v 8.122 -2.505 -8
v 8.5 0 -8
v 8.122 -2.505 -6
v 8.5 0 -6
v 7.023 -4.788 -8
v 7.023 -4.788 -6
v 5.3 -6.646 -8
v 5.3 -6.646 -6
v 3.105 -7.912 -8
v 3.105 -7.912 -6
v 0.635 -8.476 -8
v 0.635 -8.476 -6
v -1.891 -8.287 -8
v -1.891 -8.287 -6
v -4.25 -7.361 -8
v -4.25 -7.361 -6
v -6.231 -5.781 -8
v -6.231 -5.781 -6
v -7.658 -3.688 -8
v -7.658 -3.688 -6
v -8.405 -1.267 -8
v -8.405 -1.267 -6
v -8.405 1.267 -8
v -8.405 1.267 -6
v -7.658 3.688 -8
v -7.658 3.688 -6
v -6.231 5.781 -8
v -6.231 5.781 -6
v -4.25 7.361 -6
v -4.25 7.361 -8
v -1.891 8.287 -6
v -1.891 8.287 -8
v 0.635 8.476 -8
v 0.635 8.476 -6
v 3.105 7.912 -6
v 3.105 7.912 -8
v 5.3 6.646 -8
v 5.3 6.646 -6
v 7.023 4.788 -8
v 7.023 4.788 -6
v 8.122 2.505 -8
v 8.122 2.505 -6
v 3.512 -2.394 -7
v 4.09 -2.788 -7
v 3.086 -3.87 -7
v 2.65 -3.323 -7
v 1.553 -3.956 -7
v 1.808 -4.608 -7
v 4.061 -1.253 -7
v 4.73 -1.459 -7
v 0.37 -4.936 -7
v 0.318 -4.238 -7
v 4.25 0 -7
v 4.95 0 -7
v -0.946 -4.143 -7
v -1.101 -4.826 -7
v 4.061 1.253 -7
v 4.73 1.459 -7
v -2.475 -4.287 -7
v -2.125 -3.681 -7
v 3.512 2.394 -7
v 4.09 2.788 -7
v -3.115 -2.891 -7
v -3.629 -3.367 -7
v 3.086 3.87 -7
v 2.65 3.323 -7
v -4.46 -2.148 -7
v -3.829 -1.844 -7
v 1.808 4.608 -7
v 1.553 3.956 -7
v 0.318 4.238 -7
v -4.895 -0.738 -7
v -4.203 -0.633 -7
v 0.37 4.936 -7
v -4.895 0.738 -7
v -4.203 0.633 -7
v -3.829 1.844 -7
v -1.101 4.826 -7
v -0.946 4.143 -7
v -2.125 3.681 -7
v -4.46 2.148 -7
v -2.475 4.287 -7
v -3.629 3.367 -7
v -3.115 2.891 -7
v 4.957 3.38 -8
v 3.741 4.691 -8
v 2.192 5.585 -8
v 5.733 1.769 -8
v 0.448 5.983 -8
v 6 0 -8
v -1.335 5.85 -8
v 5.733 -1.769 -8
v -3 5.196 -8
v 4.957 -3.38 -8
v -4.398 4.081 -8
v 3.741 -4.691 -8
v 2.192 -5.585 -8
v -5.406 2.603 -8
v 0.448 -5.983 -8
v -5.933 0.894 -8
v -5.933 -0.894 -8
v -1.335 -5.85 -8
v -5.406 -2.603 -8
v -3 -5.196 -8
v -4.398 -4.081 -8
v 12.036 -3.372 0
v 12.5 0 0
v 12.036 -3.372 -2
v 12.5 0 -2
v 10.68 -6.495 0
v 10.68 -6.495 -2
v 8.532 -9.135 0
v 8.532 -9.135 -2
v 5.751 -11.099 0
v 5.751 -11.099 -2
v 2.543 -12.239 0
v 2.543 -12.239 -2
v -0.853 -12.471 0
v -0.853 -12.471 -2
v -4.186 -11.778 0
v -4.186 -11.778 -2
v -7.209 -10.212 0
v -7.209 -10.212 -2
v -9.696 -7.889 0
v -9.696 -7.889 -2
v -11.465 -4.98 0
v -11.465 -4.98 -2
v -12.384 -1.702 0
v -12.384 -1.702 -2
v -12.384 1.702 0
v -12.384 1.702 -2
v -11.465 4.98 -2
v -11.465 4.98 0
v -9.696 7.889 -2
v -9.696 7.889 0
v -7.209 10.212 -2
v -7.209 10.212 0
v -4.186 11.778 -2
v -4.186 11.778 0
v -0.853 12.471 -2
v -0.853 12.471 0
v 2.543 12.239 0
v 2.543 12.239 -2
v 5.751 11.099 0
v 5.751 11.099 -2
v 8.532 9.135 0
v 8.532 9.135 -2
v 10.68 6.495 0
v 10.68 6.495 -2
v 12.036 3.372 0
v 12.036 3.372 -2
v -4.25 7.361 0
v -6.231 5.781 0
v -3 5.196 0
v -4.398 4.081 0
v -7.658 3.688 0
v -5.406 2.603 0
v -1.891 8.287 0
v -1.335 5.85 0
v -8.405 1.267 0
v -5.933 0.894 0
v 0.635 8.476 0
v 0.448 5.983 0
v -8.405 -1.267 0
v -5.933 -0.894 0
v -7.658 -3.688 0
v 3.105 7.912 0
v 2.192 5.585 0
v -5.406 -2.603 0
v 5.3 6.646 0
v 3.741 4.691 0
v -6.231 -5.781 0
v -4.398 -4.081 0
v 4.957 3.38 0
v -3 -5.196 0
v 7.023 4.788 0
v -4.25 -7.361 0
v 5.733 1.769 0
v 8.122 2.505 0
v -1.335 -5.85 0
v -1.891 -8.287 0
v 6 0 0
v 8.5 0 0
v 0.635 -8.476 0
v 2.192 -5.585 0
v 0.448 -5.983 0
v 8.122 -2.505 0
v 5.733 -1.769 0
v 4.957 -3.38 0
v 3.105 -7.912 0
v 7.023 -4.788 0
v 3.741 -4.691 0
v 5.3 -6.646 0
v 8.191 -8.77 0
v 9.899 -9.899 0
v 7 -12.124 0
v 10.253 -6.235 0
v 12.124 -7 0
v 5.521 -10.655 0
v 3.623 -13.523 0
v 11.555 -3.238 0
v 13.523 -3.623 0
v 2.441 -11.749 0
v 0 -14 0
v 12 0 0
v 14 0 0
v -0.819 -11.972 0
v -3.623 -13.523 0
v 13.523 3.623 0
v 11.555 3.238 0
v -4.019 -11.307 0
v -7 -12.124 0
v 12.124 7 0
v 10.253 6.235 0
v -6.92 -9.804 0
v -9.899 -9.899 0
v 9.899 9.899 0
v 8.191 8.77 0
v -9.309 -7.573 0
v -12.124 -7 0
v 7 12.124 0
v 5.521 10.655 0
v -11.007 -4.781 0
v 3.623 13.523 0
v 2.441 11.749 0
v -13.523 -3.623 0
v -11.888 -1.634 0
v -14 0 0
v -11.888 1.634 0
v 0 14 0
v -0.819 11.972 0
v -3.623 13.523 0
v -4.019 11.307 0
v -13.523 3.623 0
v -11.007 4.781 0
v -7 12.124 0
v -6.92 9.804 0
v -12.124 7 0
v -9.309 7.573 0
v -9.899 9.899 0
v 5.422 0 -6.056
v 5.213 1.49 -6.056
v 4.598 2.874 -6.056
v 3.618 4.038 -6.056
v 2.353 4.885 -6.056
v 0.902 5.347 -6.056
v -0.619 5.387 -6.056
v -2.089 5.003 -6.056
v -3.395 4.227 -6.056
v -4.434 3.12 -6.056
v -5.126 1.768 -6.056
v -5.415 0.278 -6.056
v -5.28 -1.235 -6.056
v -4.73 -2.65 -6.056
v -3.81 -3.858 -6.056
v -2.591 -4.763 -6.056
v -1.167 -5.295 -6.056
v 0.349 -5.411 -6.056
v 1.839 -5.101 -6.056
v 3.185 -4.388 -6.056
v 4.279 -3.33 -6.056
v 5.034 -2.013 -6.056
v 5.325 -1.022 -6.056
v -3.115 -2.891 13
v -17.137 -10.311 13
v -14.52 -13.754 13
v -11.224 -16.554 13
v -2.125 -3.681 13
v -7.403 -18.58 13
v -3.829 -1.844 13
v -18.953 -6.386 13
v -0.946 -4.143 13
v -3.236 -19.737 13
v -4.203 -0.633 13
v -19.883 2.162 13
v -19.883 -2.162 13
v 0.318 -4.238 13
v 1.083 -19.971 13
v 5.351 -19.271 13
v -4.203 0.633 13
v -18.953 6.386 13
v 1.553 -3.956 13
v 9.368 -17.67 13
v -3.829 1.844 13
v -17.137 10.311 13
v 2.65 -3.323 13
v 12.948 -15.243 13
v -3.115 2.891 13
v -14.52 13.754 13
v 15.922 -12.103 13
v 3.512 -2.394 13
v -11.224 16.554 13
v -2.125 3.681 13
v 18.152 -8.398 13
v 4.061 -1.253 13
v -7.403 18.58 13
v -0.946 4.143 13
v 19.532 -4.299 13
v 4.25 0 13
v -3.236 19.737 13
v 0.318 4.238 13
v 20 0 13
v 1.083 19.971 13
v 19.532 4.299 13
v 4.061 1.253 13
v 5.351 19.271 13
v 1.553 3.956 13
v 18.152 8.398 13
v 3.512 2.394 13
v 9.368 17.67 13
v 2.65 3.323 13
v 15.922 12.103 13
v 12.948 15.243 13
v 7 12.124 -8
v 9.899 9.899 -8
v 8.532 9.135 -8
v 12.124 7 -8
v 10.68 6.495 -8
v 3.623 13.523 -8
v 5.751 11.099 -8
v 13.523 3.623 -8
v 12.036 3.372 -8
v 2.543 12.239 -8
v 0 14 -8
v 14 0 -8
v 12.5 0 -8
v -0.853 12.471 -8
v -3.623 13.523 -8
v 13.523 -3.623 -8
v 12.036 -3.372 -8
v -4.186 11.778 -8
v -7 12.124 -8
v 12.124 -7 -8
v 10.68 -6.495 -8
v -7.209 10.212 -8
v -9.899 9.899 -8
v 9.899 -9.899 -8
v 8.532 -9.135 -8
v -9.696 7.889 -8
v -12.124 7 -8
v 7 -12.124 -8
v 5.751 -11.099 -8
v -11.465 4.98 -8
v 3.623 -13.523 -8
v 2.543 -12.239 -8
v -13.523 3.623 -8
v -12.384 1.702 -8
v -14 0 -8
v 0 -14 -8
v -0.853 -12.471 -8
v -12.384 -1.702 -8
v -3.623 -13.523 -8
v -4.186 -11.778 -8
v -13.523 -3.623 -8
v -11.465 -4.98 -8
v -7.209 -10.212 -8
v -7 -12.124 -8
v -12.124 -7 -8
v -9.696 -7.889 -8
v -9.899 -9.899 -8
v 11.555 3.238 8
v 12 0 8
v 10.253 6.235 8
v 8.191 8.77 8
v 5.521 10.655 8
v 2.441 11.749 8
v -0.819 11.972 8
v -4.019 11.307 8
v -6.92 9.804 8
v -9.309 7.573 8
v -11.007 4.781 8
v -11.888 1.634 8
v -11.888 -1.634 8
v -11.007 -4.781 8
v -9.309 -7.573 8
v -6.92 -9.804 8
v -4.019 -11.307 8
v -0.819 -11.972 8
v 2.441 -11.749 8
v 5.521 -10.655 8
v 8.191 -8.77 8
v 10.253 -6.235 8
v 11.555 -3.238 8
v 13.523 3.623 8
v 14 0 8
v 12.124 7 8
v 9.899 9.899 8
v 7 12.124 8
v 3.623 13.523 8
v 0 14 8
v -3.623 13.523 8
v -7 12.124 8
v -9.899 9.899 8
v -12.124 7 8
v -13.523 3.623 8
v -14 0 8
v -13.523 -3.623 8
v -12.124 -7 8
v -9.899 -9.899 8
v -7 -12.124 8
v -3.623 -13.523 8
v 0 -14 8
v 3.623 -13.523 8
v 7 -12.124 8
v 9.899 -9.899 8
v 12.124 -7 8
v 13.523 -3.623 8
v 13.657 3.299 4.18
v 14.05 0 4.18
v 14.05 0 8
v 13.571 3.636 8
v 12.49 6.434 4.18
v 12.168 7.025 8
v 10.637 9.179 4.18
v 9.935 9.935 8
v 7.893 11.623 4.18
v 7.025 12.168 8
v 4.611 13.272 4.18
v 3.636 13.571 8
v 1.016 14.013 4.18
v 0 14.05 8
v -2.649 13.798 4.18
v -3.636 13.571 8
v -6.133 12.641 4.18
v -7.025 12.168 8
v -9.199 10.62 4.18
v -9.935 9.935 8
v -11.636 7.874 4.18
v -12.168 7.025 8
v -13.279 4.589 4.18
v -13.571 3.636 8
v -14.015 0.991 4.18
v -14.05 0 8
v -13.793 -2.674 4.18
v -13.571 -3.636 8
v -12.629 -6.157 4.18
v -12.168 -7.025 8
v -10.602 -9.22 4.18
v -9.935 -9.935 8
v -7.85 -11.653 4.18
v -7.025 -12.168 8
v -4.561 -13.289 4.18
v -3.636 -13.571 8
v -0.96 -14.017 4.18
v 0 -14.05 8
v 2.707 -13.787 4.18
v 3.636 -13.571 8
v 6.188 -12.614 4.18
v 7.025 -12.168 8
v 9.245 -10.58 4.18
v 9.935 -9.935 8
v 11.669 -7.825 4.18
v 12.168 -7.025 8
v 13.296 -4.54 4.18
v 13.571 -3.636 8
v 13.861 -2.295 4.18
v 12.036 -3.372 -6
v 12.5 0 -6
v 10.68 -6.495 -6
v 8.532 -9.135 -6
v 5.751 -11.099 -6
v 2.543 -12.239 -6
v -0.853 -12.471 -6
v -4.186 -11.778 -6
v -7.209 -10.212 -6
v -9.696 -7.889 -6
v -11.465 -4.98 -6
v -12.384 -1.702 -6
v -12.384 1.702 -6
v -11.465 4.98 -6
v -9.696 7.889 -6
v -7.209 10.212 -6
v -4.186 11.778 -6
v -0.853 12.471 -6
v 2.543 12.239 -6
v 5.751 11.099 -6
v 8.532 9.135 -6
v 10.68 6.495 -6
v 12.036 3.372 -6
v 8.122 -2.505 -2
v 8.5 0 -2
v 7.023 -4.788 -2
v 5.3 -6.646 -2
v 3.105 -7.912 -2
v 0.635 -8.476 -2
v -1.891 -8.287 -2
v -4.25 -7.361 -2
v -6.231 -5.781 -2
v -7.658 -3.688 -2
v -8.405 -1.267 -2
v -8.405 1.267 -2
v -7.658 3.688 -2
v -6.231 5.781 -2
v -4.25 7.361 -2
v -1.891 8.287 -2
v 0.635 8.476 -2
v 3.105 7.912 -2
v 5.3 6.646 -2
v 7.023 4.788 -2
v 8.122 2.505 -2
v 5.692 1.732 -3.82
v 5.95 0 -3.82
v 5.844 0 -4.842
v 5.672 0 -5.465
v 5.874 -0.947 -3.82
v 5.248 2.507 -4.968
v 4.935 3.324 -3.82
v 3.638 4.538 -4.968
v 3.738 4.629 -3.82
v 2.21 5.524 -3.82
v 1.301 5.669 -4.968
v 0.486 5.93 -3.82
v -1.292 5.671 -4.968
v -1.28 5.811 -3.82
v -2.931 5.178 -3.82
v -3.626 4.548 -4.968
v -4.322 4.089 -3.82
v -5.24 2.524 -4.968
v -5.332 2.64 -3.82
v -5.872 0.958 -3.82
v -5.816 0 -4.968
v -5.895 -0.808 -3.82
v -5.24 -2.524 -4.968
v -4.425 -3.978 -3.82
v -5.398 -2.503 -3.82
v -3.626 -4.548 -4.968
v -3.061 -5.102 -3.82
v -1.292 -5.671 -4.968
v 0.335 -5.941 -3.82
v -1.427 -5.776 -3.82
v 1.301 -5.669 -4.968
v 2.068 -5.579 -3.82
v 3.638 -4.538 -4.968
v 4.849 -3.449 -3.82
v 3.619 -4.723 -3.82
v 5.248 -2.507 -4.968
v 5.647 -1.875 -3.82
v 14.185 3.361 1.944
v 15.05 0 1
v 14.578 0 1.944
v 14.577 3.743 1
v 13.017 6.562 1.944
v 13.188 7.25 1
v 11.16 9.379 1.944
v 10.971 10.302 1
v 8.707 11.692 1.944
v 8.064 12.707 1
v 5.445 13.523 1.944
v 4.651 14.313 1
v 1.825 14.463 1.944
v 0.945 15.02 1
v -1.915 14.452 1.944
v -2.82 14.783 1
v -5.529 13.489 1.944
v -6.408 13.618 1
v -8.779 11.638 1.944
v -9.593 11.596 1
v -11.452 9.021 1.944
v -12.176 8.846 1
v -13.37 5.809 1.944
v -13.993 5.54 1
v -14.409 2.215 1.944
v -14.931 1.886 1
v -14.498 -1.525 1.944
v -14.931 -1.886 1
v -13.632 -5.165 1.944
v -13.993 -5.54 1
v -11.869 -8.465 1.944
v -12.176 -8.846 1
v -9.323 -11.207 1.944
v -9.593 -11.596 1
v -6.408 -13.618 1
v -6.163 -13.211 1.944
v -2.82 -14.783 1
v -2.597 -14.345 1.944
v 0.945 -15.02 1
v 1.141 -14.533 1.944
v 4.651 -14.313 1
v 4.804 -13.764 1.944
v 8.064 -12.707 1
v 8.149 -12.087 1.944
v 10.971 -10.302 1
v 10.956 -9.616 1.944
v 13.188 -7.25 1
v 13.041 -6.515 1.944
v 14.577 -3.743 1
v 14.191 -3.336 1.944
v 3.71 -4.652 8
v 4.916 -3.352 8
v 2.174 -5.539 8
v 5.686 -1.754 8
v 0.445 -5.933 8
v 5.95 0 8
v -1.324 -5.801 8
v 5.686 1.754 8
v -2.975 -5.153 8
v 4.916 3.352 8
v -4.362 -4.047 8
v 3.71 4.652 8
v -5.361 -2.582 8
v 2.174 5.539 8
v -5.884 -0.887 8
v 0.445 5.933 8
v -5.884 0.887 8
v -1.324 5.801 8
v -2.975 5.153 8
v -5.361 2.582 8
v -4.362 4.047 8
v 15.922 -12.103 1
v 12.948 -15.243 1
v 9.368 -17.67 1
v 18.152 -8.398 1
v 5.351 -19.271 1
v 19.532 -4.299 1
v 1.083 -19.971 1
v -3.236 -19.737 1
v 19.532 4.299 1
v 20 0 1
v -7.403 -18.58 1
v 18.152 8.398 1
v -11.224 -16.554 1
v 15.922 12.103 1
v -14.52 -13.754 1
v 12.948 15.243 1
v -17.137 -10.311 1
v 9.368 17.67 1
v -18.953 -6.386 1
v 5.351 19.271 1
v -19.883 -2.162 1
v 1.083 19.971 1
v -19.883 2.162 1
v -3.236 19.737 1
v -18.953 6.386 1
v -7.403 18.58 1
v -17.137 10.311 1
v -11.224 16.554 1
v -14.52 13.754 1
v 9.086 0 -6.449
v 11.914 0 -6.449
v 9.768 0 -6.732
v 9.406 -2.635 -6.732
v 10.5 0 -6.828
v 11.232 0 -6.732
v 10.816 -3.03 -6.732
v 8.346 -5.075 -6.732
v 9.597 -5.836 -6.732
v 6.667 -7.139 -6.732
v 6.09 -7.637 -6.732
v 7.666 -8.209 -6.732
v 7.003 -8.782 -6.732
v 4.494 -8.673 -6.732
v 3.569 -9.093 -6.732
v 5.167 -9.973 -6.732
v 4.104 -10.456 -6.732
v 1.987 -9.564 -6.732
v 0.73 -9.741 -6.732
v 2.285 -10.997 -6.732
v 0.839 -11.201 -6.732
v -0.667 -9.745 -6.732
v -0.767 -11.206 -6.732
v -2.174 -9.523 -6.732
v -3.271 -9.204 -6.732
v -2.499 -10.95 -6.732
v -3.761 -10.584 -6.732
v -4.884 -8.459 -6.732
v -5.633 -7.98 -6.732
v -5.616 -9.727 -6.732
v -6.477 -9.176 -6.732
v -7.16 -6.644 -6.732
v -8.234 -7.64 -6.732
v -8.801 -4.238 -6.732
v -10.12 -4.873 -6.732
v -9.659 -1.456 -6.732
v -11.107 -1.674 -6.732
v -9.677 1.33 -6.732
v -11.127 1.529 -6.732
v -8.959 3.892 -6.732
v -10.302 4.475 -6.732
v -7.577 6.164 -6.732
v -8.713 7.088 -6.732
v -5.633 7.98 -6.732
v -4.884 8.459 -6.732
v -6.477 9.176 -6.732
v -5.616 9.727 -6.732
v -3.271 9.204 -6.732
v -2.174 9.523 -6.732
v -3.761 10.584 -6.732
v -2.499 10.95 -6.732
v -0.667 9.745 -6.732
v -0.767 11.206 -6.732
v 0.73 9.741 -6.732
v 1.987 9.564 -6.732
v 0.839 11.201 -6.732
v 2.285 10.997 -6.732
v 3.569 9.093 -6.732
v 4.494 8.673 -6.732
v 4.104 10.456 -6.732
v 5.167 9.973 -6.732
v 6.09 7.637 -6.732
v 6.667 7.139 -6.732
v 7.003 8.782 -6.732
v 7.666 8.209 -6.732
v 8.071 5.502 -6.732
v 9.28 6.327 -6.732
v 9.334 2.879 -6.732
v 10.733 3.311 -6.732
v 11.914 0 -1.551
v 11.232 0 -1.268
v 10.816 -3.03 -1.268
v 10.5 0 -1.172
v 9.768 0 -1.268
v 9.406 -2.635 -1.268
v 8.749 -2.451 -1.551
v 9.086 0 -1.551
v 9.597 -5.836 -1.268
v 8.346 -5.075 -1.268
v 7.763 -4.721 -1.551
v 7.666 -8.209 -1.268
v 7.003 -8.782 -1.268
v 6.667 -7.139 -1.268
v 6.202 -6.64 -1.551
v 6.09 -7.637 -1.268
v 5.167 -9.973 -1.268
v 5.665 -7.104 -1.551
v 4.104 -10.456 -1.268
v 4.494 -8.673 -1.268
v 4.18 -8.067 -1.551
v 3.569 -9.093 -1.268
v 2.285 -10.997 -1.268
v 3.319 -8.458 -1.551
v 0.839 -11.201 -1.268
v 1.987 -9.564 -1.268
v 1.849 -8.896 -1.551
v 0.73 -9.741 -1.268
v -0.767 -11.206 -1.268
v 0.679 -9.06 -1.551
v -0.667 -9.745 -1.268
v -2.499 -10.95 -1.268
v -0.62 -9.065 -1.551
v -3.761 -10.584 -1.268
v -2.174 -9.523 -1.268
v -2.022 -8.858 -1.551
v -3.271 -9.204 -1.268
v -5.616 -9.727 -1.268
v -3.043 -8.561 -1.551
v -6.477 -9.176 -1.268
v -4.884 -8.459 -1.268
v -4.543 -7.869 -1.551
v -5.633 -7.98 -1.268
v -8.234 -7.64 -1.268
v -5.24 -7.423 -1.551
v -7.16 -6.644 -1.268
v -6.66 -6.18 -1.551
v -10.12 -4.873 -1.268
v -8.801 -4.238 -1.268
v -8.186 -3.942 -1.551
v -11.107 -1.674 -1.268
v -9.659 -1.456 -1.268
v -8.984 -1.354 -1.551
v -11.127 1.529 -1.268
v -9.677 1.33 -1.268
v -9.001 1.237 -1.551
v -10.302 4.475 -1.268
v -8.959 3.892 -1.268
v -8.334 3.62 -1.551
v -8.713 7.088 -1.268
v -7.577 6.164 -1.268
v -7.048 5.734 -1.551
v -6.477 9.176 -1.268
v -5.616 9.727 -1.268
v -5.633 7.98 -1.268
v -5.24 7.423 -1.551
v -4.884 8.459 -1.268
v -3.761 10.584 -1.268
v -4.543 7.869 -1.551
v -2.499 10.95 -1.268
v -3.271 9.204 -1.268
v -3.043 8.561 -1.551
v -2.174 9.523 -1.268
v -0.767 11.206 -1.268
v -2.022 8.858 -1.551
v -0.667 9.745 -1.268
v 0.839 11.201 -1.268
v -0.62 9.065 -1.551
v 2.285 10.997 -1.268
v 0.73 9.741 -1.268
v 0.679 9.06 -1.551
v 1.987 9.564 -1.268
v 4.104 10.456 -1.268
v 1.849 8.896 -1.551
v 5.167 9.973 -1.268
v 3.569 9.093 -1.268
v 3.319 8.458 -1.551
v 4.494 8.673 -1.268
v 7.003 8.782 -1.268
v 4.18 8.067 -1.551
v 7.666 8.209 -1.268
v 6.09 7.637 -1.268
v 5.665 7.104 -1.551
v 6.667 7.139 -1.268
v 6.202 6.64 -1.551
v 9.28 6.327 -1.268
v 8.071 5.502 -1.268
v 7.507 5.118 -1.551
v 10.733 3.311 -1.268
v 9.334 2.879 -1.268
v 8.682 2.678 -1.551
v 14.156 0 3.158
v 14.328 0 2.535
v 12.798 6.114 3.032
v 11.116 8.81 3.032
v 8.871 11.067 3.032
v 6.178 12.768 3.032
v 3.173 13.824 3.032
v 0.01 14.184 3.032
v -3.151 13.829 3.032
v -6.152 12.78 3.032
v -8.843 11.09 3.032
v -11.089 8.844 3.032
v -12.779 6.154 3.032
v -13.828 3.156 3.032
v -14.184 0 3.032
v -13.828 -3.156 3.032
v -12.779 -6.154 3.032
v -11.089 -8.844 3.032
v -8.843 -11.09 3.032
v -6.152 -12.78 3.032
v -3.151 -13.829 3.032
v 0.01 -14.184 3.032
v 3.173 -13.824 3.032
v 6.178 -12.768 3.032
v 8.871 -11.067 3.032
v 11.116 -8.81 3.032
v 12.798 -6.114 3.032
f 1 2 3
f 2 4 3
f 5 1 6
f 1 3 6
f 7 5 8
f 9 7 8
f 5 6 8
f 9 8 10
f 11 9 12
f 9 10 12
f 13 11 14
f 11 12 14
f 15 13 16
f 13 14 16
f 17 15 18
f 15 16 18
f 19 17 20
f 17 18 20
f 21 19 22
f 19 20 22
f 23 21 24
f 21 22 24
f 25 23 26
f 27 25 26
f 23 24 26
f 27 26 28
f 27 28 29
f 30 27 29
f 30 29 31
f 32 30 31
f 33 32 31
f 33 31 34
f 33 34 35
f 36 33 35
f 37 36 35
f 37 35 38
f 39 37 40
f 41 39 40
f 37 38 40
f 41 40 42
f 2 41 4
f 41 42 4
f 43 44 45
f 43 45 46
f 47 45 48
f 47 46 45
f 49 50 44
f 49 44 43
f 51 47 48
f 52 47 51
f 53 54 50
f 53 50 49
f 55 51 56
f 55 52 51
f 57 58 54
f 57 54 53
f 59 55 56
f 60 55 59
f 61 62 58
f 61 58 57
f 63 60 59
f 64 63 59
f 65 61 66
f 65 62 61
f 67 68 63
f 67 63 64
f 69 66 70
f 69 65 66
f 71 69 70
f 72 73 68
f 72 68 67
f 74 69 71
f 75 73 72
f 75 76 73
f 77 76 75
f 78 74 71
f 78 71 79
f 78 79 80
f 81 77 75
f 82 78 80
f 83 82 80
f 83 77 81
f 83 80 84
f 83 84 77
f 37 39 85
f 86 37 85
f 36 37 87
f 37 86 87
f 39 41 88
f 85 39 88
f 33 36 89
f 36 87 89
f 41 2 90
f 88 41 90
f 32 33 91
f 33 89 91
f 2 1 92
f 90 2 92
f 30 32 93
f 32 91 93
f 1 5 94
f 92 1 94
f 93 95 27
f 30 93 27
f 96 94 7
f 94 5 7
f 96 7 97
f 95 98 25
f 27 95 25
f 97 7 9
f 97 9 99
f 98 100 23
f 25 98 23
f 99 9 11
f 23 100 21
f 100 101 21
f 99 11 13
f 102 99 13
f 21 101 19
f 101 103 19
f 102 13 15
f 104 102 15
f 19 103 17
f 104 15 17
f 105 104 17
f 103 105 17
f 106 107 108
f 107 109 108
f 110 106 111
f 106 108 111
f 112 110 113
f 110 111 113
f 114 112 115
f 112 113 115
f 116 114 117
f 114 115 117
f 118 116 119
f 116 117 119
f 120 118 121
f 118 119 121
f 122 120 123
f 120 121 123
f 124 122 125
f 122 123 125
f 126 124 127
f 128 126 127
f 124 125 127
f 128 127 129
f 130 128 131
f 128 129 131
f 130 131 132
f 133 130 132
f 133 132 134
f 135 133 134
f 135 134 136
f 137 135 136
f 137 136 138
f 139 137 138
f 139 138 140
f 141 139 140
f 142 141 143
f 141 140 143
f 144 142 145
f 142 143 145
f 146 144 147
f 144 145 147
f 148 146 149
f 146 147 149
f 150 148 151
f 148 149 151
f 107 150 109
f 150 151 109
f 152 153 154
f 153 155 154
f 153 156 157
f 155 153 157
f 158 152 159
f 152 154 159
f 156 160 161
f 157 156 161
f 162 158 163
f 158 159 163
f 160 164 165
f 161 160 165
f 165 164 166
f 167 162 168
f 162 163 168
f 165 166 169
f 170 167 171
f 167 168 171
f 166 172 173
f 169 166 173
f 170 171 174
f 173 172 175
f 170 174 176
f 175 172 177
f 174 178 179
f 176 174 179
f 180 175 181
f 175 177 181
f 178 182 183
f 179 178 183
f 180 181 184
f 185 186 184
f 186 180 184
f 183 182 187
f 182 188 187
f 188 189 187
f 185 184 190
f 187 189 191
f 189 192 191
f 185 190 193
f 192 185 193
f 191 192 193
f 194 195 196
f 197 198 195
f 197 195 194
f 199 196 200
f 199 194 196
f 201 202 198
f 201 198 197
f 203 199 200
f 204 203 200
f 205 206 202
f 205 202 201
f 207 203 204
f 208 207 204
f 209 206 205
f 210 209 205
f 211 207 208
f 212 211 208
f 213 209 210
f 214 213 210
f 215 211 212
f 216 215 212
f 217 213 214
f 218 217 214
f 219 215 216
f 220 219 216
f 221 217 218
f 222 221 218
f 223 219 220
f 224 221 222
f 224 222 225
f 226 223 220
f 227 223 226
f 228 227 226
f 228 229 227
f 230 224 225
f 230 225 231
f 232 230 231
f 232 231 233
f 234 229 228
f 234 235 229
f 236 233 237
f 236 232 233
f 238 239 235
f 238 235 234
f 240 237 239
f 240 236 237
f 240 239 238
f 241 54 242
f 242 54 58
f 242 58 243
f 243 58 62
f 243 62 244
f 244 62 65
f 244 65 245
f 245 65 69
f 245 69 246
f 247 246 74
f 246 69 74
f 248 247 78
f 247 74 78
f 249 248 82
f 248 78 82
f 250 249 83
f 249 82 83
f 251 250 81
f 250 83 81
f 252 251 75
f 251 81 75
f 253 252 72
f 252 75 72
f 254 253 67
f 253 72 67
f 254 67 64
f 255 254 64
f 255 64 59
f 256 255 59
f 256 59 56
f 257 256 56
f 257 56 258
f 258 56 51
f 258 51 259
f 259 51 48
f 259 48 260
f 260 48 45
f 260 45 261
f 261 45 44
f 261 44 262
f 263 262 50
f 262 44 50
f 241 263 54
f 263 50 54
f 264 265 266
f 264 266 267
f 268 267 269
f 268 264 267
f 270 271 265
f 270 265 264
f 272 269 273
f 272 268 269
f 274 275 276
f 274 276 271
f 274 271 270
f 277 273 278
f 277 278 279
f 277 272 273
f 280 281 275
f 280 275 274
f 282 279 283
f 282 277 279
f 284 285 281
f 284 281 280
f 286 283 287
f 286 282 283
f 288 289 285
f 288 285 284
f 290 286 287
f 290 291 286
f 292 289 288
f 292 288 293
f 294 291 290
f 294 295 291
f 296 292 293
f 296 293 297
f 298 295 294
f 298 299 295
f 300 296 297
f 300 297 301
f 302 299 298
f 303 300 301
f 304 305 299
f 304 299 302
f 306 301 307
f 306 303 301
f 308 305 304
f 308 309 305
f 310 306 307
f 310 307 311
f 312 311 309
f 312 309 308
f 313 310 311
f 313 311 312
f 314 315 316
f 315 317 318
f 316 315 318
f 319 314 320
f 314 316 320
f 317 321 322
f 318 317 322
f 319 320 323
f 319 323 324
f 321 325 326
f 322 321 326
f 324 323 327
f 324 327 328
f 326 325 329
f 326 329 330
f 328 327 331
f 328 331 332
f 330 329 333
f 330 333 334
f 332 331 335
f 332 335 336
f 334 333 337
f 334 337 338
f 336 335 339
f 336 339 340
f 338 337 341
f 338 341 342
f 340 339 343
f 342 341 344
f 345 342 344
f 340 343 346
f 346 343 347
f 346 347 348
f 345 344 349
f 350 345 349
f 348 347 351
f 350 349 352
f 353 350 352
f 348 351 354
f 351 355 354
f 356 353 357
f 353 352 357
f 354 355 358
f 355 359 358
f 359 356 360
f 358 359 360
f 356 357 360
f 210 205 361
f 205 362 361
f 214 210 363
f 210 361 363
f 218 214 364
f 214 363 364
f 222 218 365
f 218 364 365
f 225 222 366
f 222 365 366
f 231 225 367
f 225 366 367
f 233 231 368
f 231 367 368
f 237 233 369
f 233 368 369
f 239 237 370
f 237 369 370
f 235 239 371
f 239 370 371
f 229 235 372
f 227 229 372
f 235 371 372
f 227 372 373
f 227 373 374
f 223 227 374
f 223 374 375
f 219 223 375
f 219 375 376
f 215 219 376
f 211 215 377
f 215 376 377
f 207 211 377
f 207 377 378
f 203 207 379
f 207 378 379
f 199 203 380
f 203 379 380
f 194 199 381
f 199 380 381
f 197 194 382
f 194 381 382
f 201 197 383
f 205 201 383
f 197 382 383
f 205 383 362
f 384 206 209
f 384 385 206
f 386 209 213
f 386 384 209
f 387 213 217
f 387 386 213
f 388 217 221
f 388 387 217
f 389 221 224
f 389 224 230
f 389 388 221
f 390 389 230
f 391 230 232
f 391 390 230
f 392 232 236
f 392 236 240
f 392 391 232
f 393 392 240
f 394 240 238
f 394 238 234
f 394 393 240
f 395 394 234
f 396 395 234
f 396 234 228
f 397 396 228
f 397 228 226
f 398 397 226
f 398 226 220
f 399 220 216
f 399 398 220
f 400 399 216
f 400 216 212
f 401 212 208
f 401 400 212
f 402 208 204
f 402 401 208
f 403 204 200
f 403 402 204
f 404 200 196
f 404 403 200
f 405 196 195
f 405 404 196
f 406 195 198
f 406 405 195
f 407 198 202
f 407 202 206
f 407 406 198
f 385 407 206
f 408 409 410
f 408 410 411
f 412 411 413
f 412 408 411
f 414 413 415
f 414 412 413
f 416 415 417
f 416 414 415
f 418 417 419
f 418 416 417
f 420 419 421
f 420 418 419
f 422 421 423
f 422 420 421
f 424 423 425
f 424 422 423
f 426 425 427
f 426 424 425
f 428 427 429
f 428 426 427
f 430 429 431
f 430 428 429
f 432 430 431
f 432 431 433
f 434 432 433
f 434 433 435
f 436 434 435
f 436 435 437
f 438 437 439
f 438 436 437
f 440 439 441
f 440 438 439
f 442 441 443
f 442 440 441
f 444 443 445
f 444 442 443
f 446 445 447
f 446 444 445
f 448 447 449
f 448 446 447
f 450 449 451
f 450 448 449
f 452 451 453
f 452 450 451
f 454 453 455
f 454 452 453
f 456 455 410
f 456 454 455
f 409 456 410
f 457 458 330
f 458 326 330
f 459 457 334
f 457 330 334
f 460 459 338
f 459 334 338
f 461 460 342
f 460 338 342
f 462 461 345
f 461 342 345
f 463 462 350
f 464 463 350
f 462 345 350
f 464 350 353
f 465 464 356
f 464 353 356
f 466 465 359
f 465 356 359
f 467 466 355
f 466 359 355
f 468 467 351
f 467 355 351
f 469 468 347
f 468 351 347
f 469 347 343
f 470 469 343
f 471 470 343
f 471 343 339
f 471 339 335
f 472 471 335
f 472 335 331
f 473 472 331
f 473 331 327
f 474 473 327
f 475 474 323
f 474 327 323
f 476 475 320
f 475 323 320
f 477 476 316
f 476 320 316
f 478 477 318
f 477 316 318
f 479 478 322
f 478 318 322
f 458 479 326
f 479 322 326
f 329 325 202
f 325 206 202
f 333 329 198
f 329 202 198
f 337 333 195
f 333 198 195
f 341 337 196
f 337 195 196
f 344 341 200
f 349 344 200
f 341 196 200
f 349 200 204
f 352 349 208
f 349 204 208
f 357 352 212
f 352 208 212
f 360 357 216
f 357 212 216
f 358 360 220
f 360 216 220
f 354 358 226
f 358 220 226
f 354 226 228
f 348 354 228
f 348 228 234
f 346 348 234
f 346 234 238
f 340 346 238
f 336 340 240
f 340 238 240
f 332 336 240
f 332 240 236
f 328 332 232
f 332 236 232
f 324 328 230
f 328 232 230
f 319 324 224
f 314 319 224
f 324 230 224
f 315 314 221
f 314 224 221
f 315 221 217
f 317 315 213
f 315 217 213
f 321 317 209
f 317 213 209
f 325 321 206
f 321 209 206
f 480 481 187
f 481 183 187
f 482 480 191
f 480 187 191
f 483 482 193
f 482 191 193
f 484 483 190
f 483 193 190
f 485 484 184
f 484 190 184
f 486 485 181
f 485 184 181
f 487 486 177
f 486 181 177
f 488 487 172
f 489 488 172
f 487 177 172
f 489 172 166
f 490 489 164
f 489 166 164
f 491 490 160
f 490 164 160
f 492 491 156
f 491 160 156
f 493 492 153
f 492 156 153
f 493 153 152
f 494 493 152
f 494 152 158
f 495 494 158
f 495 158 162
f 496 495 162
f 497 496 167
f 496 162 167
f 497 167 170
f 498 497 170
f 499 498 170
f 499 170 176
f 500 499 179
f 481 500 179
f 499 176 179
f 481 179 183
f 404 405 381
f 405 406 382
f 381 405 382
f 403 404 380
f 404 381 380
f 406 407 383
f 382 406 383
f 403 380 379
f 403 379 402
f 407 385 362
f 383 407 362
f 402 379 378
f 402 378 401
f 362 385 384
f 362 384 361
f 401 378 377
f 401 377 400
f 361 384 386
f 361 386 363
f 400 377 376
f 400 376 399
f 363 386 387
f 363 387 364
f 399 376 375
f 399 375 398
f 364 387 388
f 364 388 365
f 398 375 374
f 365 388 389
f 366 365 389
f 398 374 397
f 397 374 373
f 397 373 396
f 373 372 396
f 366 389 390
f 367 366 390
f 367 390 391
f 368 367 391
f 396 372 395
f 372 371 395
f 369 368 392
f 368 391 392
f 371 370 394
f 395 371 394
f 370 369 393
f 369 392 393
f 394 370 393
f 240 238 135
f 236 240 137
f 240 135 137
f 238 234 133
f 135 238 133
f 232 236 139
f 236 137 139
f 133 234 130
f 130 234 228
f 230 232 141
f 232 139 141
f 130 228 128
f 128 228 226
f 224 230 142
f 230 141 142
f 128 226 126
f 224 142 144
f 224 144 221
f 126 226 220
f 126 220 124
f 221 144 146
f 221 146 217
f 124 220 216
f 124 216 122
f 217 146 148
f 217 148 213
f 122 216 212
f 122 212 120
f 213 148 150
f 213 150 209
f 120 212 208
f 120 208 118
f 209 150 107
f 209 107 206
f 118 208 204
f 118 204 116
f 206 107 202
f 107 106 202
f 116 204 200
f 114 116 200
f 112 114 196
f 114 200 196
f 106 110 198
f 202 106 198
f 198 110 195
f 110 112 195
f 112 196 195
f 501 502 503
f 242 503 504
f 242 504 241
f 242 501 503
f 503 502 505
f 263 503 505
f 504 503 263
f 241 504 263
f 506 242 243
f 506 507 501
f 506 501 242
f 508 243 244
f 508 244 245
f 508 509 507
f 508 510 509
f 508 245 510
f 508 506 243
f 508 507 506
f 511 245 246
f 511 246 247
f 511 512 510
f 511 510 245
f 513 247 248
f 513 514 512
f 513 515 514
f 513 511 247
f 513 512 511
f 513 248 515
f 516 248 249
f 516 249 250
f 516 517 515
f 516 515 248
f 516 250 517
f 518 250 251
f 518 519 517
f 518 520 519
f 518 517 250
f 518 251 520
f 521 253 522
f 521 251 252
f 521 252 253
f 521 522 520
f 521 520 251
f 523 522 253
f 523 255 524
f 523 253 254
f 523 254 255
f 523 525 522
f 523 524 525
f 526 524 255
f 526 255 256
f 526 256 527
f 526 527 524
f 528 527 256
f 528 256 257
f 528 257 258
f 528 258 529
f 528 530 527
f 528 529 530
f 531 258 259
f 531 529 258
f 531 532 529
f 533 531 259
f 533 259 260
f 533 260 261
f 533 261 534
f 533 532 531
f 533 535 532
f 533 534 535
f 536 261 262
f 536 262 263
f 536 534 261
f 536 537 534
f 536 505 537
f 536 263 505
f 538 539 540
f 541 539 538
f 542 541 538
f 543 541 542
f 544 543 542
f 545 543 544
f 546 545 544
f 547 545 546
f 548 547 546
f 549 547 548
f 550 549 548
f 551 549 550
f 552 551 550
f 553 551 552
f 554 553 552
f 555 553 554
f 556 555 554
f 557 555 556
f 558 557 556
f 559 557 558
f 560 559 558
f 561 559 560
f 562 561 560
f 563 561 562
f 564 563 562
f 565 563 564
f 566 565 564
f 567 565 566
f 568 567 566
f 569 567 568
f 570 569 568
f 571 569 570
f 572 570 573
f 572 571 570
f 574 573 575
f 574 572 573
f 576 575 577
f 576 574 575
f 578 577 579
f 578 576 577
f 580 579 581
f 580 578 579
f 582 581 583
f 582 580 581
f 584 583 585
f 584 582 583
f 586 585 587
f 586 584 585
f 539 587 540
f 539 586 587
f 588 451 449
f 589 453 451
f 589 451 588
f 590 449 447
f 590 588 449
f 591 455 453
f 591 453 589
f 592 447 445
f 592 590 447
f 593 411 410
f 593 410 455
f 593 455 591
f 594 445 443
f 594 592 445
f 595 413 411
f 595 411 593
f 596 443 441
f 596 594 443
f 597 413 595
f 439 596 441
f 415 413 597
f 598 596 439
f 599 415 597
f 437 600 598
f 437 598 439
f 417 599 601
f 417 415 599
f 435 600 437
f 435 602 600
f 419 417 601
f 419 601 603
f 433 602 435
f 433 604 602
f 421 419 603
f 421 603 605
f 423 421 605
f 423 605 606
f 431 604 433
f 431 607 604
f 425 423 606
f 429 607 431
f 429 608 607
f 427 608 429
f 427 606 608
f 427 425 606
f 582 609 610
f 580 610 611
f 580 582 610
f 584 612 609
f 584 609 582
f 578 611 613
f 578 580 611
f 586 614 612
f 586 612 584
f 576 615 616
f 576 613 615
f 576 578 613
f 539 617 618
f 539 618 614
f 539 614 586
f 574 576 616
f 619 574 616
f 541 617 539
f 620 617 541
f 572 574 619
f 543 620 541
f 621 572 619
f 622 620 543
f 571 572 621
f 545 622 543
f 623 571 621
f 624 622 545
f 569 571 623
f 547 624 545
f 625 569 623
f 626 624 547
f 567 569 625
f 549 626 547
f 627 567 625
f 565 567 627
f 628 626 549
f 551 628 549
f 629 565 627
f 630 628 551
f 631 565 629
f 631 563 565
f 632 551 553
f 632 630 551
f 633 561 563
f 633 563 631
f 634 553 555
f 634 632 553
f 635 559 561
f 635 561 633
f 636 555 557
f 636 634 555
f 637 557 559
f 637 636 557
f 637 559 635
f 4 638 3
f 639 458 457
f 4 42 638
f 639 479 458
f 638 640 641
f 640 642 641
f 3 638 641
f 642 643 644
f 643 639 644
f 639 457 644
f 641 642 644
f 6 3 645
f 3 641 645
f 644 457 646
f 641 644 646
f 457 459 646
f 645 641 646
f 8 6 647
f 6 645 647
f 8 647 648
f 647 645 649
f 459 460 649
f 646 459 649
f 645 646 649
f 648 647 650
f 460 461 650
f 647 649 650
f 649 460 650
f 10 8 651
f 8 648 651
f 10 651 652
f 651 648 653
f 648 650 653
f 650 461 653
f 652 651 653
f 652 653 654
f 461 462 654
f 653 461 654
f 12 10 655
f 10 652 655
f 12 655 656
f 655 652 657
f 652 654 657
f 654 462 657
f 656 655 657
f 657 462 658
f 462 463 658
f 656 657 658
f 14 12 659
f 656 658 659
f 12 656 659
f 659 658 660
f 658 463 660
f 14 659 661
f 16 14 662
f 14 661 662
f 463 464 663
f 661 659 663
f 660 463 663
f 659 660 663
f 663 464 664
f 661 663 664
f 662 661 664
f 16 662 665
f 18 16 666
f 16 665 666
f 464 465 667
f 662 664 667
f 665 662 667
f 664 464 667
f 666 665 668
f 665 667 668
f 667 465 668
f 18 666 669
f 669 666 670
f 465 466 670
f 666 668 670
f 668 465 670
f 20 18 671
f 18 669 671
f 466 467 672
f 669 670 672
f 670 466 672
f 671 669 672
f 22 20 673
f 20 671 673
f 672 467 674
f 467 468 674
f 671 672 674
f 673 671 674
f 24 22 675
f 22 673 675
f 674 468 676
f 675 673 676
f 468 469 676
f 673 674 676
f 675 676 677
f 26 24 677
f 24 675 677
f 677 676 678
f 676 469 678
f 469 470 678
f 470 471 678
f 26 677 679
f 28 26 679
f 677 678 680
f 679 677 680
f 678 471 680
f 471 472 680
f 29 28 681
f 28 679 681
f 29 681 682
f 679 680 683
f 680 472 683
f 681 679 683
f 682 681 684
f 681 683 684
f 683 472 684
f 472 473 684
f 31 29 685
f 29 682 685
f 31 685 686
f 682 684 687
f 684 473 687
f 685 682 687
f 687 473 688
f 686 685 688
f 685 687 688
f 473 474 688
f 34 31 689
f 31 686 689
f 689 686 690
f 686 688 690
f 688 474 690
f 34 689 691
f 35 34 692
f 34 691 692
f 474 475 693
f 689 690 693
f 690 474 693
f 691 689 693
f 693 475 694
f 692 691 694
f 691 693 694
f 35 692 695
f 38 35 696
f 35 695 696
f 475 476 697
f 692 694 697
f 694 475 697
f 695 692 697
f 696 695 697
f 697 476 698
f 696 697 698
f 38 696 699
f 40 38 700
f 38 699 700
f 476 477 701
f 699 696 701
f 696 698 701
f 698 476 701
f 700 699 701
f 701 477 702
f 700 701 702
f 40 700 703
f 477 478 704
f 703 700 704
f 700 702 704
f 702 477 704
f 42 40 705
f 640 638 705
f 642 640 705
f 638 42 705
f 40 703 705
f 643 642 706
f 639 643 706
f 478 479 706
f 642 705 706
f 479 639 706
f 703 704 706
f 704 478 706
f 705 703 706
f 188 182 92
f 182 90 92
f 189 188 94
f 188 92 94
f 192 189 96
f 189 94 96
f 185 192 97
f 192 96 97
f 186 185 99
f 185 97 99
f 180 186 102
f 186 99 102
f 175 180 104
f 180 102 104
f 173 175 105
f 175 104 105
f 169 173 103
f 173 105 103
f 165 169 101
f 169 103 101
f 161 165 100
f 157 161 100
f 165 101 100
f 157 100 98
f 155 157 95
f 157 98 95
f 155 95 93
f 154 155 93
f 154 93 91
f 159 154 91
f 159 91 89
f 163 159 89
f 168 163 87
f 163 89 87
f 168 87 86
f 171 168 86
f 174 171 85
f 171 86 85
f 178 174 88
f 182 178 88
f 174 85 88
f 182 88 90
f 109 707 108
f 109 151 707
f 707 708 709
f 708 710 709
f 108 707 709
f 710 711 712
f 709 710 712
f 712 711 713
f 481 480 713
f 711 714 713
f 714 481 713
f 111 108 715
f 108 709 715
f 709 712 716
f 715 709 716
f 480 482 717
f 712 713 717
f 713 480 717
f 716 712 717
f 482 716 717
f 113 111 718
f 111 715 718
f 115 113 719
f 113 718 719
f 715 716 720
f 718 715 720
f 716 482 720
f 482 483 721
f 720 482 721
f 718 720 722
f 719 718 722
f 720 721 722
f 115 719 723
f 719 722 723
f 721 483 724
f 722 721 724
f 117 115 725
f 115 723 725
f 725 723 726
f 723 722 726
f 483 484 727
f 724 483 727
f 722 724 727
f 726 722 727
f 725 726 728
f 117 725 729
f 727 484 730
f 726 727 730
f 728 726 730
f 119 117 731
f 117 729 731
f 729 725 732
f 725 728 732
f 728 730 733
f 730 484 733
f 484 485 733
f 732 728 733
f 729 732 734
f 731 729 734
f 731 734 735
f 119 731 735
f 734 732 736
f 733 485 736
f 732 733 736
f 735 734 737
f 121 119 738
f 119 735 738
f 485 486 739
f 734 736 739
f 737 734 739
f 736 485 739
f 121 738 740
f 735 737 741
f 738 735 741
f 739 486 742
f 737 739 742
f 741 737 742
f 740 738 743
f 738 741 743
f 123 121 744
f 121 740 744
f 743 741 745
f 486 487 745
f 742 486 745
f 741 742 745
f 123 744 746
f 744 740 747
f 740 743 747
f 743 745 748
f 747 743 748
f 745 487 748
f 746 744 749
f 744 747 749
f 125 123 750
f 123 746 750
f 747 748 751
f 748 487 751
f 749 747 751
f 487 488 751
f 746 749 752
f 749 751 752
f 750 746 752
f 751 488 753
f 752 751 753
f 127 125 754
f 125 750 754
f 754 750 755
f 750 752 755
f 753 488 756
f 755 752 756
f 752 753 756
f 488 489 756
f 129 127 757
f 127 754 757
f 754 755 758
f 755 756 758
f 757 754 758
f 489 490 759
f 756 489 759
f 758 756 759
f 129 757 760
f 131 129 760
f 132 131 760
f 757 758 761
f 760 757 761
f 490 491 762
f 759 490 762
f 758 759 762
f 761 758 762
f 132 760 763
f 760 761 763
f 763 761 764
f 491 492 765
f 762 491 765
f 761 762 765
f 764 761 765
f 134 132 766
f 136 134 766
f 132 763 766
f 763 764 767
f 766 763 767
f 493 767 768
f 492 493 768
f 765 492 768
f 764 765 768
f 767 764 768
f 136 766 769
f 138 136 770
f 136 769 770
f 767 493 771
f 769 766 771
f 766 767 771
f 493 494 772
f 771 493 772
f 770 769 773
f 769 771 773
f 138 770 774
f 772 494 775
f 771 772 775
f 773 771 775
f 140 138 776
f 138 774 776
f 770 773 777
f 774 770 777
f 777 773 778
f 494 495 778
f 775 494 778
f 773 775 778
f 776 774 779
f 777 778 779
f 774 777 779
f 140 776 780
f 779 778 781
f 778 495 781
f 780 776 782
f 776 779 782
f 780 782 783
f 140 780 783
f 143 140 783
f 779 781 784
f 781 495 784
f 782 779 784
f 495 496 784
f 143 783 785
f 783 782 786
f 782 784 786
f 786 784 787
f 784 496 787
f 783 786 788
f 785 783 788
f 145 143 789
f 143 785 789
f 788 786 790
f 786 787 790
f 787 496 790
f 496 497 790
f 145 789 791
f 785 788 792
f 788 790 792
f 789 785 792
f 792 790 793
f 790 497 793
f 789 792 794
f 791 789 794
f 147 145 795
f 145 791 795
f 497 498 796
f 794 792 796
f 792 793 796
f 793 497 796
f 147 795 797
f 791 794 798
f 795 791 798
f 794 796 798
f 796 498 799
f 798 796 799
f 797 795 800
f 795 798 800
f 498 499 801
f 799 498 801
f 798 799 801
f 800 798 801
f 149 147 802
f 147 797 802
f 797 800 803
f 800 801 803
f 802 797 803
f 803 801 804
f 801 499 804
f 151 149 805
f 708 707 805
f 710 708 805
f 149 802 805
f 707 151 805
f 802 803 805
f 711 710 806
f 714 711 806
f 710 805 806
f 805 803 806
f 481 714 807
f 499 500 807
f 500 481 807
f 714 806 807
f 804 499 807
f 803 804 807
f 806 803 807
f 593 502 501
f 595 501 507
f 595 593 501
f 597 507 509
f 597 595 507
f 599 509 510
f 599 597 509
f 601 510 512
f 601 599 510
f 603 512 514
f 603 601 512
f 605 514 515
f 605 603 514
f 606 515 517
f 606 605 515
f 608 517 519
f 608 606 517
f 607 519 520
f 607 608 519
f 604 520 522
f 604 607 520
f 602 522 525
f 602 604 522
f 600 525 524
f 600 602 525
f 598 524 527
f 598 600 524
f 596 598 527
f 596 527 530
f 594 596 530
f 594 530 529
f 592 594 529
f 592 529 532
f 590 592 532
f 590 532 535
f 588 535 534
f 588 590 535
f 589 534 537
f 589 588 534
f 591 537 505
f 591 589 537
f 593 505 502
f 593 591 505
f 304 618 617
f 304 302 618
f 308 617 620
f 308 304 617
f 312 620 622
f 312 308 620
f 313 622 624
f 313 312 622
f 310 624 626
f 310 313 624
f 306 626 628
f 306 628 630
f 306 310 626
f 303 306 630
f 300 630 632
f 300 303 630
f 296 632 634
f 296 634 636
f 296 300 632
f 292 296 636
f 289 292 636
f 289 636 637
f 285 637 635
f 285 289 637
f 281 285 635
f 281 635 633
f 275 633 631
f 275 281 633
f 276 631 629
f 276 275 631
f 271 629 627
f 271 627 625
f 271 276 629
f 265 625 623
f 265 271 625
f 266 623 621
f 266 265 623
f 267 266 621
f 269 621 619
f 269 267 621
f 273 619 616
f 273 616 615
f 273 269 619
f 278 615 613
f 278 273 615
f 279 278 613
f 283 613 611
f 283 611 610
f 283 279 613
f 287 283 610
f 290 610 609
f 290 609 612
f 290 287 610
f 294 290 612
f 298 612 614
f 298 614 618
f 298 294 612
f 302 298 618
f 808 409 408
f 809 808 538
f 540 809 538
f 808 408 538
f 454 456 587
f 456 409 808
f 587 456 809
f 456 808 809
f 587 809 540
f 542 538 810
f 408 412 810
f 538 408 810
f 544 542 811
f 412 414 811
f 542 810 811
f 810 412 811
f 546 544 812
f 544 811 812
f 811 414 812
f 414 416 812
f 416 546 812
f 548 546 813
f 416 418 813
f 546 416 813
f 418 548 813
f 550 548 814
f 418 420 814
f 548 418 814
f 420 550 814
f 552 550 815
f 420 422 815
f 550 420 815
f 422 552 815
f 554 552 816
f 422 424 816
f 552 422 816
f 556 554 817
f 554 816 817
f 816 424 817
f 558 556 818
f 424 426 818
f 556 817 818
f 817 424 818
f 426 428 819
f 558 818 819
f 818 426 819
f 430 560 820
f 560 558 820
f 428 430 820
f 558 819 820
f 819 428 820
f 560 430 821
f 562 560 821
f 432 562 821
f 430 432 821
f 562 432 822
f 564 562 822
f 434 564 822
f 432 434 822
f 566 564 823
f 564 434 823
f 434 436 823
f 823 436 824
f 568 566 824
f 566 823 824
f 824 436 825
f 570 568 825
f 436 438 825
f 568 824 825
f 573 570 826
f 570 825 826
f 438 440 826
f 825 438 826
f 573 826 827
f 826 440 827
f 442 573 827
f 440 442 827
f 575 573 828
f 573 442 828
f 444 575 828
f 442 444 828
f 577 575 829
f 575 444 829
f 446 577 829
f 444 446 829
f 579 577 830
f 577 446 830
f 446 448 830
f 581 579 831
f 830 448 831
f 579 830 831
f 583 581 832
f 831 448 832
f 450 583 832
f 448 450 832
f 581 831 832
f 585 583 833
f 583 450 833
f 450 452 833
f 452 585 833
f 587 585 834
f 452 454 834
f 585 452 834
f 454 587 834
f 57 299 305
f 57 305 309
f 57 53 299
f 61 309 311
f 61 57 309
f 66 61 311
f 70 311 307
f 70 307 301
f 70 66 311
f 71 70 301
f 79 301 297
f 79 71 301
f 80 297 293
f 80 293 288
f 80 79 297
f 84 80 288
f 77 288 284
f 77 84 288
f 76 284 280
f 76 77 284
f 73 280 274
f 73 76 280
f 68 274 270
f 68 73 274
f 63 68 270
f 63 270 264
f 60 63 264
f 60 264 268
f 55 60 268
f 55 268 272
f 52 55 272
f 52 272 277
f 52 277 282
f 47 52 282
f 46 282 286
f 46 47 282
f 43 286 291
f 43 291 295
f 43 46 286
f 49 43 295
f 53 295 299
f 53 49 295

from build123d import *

# Parameters (mm, degrees)
F0_W     = 2
F0_H     = 8
F6_SIZE2 = 1
F6_SIZE  = 2
F7_SIZE2 = 1
F7_SIZE  = 2
F8_R     = 5


with BuildPart() as f1:
    # F0 (on Front) → F1 (revolve)
    with BuildSketch(Plane.XZ):
        with Locations((13, 4)):
            Rectangle(F0_W, F0_H)
    revolve(axis=Axis((0, 0, 16.0184632987), (0, 0, 1)))


with BuildPart() as f3:
    # F2 (on Front) → F3 (revolve)
    with BuildSketch(Plane.XZ):
        Polygon((14.05, 8), (14.05, 1), (20, 1), (20, 13), (4.25, 13), (4.25, -7), (5.95, -7), (5.95, 8), align=None)
    revolve(axis=Axis((0, 0, 8.1785988285), (0, 0, 1)))

    # F6
    f6_edges = [f3.edges().sort_by_distance(p)[0] for p in [
        (-14.05, 0, 1),
    ]]
    chamfer(f6_edges, length=F6_SIZE, length2=F6_SIZE2)

    # F7
    f7_edges = [f3.edges().sort_by_distance(p)[0] for p in [
        (-5.95, 0, -7),
    ]]
    f7_side = f3.faces().sort_by_distance((-5.95, 0, 0.5))[0]
    chamfer(f7_edges, length=F7_SIZE, length2=F7_SIZE2, reference=f7_side)

    # F8
    f8_edges = [f3.edges().sort_by_distance(p)[0] for p in [
        (-14.05, 0, 3),
        (-5.95, 0, -5),
    ]]
    fillet(f8_edges, radius=F8_R)


with BuildPart() as f5:
    # F4 (on Front) → F5 (revolve)
    with BuildSketch(Plane.XZ):
        with BuildLine():
            Line((14, -8), (14, 0))
            Line((14, 0), (12.5, 0))
            Line((12.5, 0), (12.5, -2))
            ThreePointArc((12.5, -2), (10.5, -1.1715728753), (8.5, -2))
            Line((8.5, -2), (8.5, 0))
            Line((8.5, 0), (6, 0))
            Line((6, 0), (6, -8))
            Line((6, -8), (8.5, -8))
            Line((8.5, -8), (8.5, -6))
            ThreePointArc((8.5, -6), (10.5, -6.8284271247), (12.5, -6))
            Line((12.5, -6), (12.5, -8))
            Line((12.5, -8), (14, -8))
        make_face()
    revolve(axis=Axis((0, 0, -10.4025015607), (0, 0, -1)))


solid = Compound([f1.part, f3.part, f5.part])
